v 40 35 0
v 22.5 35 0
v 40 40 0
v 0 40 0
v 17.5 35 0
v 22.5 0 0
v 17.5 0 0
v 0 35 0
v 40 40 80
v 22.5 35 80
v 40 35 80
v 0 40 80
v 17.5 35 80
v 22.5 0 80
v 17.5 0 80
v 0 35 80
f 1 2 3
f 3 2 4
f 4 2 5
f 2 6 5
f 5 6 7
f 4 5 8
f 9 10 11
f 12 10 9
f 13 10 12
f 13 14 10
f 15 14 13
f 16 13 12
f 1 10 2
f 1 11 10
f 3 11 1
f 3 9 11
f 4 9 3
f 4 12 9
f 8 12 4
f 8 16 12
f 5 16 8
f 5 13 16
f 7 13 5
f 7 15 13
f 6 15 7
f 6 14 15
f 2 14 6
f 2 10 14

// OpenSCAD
$fn = 32;

// ----------------------------------------------------------------------
// Structural section: tee 40 x 40 mm
// ----------------------------------------------------------------------

// --- parameters (mm) ---
sec_w = 40;               // tee width, X
sec_h = 40;               // tee height, Y
flange_t = 5;             // top flange thickness
web_t = 5;                // web thickness
plate_t = 80;             // cut length, Z (extrusion height)

profile = [[17.5, 0], [22.5, 0], [22.5, 35], [40, 35], [40, 40], [0, 40], [0, 35], [17.5, 35]];  // primary outline, 8 points, counter clockwise

// --- the one profile operation ---
linear_extrude(height = plate_t) polygon(points = profile);
